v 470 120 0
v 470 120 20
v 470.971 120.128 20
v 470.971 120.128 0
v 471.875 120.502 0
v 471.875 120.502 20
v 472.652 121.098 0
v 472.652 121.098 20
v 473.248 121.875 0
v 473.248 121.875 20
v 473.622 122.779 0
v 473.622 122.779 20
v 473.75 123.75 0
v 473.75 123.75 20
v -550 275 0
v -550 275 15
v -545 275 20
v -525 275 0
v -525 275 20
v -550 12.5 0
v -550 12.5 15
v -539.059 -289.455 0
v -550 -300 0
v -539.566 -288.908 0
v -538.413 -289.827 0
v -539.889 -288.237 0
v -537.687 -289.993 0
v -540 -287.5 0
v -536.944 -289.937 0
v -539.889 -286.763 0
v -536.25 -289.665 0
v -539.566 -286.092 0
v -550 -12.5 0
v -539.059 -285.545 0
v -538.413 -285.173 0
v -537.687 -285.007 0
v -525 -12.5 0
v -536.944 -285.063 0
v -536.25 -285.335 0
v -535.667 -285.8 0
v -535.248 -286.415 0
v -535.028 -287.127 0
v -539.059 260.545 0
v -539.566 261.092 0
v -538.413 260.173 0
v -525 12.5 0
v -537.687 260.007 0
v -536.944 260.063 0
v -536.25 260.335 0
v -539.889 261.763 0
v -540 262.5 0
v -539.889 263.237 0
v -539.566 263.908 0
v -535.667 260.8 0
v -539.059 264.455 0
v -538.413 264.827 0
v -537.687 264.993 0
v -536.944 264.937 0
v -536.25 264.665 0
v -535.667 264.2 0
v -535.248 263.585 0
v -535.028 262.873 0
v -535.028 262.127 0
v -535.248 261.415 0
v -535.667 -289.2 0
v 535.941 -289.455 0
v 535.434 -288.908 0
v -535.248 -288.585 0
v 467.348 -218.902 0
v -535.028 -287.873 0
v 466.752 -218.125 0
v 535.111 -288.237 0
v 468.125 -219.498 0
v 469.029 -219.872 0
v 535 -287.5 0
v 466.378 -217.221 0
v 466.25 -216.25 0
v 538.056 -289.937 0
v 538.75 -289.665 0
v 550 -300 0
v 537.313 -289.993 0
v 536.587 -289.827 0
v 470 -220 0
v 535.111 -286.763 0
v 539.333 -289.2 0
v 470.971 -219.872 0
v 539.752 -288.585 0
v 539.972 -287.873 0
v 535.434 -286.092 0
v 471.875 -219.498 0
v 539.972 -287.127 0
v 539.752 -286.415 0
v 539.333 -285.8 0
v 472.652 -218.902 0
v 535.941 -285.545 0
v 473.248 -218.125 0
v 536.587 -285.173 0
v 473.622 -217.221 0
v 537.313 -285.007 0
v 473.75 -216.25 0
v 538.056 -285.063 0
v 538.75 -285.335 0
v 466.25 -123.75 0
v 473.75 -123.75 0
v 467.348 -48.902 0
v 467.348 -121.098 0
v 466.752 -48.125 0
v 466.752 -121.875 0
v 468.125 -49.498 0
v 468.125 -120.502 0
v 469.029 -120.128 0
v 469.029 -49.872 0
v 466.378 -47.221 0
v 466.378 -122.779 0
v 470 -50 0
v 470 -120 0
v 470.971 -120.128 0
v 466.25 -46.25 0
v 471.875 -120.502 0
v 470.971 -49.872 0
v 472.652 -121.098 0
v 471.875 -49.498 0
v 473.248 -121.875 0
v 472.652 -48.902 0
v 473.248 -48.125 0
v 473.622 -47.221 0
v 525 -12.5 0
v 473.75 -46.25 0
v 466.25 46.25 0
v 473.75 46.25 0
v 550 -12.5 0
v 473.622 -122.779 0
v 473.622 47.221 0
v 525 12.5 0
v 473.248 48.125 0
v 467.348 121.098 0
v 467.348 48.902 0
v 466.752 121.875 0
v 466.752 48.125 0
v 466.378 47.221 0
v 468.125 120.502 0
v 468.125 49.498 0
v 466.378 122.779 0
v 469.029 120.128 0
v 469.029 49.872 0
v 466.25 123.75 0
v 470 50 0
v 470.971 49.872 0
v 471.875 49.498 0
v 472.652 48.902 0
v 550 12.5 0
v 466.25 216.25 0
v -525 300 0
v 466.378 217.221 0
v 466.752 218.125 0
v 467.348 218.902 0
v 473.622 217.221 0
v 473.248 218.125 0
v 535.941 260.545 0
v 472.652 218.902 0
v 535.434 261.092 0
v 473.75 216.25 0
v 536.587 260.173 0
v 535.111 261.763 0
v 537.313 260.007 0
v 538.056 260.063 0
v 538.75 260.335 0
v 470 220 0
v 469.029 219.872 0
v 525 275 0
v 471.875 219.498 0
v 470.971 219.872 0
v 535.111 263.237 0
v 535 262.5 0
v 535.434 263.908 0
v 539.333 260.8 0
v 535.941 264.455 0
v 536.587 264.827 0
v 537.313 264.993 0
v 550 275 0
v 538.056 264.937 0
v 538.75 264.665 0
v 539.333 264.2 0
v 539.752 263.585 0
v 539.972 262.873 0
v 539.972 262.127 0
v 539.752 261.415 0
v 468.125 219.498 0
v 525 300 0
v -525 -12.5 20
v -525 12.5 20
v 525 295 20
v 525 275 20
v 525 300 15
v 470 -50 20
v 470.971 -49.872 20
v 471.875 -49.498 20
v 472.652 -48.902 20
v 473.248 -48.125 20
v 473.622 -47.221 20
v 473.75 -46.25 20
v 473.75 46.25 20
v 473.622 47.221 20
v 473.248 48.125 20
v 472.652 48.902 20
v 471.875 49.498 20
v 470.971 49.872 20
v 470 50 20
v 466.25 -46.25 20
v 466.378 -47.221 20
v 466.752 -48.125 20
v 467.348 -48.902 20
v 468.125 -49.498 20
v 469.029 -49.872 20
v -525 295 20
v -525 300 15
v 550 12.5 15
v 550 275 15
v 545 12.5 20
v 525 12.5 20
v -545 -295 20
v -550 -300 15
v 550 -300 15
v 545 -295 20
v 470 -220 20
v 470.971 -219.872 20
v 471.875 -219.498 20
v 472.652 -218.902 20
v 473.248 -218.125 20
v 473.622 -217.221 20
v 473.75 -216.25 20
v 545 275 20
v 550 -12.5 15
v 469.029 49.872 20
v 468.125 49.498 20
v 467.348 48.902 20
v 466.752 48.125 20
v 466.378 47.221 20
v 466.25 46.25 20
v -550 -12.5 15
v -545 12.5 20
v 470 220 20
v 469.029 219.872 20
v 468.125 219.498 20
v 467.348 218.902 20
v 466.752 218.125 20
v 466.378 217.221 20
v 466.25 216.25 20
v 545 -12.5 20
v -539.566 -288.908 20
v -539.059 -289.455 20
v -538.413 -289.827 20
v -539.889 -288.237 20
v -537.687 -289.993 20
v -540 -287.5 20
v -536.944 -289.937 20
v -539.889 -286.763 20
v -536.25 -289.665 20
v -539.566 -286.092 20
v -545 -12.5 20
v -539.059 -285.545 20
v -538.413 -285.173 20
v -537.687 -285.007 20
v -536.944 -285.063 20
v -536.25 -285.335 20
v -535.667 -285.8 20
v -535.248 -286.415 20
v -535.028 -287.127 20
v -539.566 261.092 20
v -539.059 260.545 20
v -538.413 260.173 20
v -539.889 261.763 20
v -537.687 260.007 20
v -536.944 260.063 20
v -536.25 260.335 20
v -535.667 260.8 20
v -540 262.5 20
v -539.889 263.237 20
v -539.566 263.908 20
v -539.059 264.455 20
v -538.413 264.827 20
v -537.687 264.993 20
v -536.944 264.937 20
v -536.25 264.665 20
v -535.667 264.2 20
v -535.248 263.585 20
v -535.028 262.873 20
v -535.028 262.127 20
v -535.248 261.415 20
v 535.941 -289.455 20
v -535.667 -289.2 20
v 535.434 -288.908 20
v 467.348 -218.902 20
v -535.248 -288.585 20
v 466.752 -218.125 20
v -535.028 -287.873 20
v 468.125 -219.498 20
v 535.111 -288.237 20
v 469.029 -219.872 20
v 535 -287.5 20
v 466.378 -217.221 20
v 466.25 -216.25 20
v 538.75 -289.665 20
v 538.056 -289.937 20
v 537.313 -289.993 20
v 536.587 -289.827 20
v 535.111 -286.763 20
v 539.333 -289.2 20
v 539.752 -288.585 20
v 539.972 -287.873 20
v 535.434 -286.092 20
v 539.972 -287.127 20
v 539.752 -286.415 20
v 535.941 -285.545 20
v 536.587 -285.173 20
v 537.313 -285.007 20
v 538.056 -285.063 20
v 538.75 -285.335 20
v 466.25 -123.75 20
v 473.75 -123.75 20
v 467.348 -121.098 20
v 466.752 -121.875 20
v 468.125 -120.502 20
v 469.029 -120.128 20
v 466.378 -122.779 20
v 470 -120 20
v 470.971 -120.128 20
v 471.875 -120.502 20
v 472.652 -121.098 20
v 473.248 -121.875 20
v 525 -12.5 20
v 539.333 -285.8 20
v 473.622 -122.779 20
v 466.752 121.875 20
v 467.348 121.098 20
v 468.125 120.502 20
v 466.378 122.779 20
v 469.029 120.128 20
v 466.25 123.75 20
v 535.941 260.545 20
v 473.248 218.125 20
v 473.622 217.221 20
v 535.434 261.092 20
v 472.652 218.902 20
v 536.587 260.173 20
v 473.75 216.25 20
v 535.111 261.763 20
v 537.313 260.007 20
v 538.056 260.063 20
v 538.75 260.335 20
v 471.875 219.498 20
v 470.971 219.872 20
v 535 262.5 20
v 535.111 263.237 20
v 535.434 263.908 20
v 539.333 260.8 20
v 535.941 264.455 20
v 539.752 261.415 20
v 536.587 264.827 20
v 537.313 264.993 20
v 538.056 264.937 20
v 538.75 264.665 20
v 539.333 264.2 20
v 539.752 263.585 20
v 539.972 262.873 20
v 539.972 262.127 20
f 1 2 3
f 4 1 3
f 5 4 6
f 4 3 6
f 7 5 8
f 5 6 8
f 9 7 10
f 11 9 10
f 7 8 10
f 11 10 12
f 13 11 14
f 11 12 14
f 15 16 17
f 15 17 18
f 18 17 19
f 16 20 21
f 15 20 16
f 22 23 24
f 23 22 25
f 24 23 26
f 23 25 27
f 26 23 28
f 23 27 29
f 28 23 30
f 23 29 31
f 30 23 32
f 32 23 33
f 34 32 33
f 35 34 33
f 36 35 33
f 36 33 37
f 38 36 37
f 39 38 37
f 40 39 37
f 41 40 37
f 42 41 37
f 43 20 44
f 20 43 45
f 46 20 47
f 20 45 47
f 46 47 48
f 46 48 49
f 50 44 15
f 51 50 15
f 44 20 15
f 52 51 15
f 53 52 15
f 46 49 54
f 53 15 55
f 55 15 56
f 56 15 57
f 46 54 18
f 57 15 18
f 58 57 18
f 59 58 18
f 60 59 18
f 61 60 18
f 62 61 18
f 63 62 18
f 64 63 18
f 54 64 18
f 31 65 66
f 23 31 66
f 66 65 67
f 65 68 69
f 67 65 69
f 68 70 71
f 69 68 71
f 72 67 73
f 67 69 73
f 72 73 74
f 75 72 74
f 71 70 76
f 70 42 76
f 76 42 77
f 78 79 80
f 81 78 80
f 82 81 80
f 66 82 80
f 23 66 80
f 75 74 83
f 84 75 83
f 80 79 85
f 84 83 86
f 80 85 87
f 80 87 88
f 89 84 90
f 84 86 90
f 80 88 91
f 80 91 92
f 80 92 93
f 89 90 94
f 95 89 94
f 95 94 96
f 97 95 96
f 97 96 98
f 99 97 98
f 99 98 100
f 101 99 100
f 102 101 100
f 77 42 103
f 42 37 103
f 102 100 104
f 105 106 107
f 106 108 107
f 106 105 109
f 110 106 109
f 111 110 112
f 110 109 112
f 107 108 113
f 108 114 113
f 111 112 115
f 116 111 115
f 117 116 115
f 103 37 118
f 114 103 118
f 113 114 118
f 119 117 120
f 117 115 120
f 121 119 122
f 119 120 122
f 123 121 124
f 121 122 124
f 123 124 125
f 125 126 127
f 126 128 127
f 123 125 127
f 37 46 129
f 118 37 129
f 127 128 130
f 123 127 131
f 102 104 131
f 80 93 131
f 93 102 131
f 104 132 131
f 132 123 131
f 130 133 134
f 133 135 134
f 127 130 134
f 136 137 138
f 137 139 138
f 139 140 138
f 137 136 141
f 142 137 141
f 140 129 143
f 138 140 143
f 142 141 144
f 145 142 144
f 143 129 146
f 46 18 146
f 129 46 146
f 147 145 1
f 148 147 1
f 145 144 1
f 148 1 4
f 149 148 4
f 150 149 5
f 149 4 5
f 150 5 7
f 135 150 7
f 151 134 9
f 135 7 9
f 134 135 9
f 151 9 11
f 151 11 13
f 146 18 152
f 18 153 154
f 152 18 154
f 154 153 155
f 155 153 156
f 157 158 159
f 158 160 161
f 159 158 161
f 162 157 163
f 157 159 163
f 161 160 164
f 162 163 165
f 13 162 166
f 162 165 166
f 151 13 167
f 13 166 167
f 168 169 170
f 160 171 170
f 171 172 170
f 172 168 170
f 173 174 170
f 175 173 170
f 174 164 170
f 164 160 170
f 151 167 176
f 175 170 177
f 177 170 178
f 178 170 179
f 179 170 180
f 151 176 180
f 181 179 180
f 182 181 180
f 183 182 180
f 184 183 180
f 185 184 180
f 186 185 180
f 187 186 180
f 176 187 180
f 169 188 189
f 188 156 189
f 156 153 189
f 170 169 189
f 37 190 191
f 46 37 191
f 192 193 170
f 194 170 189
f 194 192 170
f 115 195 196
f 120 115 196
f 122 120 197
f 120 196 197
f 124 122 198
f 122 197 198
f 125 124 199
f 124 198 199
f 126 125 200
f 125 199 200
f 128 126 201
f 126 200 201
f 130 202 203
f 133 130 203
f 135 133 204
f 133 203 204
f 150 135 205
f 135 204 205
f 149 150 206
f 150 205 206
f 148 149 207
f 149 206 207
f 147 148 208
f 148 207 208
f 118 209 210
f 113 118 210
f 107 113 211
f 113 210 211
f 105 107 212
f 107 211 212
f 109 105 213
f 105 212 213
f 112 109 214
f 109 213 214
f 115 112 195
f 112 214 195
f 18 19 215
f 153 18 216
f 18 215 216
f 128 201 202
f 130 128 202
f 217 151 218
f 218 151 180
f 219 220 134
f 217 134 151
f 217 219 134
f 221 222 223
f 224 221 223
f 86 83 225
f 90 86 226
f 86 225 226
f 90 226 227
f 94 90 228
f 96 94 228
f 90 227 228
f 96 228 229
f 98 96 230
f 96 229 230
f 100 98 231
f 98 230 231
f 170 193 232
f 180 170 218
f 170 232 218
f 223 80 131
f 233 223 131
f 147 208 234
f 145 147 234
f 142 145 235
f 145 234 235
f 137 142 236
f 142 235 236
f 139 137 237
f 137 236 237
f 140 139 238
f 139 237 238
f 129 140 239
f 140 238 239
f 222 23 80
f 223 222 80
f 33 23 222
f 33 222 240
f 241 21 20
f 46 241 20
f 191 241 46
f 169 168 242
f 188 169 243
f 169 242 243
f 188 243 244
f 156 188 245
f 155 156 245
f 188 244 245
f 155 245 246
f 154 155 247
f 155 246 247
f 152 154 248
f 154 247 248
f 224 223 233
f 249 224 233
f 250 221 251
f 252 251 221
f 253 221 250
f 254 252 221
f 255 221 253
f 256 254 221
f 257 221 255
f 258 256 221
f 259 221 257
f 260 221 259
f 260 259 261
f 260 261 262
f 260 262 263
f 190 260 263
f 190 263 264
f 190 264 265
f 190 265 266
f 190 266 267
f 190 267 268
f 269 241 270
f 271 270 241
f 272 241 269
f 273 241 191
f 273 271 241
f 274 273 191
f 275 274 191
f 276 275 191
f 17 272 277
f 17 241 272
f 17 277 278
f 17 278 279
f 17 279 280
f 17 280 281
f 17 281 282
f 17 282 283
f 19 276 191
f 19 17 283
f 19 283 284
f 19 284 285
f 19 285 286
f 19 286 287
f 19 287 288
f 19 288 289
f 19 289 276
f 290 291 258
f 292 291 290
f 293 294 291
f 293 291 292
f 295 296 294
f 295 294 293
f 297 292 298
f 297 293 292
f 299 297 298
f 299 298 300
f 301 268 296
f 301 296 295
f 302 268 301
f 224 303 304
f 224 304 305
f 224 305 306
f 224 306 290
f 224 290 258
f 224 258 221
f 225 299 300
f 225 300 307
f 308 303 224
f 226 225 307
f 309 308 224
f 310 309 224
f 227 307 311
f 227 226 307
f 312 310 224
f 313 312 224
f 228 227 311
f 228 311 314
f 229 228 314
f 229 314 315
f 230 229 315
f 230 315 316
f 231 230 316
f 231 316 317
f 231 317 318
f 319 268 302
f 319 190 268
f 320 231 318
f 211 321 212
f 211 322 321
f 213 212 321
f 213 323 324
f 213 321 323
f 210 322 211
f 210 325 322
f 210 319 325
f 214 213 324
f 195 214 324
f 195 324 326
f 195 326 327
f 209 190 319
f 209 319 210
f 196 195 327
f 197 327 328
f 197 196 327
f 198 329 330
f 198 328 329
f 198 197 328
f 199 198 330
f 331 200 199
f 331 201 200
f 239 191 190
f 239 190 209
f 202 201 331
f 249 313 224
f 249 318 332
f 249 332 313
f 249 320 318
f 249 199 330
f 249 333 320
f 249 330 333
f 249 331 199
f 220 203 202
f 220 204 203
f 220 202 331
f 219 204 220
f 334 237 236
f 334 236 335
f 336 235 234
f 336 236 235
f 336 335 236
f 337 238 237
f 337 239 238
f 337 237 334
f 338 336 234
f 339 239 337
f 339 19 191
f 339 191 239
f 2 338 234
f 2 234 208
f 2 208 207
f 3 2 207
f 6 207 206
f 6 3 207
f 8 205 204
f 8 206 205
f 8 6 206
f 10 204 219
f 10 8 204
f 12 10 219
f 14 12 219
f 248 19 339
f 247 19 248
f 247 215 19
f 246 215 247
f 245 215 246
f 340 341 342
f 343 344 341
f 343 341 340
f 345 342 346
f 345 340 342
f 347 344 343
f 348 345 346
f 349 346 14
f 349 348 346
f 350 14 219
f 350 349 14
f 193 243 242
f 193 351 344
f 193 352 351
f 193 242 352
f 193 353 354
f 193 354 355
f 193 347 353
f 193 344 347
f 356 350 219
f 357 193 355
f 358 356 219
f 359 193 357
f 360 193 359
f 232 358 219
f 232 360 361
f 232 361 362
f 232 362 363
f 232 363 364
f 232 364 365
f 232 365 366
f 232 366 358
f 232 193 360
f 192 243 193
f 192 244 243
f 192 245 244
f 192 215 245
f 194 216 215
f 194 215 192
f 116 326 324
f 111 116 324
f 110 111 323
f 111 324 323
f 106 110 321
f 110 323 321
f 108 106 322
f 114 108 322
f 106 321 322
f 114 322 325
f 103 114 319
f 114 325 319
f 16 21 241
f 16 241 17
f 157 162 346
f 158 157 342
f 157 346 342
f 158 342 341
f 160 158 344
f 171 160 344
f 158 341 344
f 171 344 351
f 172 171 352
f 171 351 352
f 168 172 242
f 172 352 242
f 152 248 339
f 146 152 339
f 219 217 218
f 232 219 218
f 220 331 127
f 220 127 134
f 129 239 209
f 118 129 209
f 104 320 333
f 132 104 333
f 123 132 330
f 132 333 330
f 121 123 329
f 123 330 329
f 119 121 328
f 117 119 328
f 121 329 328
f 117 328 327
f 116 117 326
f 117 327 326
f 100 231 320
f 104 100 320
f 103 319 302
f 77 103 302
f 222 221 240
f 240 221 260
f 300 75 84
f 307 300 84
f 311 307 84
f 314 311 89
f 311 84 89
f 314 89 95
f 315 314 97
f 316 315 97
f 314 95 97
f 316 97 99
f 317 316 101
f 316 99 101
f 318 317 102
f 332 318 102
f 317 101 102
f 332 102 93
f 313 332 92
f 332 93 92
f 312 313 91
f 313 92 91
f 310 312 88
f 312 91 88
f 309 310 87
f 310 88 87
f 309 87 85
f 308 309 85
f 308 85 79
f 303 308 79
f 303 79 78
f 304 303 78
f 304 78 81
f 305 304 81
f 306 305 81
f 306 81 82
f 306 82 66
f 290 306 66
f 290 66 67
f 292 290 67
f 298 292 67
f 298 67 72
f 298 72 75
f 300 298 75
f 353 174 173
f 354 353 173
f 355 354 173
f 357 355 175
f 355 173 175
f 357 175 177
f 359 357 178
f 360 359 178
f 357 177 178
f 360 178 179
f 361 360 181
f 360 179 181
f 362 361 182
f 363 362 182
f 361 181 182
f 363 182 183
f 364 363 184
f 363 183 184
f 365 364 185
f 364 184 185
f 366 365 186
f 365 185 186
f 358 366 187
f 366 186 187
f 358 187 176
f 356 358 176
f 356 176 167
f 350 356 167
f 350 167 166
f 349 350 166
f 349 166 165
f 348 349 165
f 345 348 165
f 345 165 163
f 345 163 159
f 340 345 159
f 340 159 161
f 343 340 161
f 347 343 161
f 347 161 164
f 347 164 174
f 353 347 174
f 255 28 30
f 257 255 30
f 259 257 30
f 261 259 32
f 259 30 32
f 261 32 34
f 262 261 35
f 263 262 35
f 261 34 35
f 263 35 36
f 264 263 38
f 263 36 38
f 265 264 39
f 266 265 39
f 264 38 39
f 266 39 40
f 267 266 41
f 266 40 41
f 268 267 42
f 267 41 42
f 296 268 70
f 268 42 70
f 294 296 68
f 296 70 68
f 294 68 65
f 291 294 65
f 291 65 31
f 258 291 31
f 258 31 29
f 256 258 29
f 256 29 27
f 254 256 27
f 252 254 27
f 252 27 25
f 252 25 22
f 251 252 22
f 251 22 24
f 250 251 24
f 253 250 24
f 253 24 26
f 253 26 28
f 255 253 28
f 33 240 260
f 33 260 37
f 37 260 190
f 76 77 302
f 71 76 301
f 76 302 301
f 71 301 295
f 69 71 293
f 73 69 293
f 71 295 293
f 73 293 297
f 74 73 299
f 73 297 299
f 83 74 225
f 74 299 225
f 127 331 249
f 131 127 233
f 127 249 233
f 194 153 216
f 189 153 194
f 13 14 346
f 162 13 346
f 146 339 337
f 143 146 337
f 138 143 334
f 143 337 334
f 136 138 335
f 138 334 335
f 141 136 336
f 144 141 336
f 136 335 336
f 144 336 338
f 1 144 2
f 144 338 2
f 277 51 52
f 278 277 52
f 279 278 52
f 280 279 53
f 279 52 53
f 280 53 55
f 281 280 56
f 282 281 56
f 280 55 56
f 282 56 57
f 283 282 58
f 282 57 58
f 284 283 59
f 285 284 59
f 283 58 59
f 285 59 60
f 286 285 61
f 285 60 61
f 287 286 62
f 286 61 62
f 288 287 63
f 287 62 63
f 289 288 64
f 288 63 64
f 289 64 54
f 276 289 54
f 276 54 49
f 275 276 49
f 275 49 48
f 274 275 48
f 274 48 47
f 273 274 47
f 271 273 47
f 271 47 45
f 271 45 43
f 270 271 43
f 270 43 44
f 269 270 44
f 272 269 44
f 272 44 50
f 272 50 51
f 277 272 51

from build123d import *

# Parameters (mm, degrees)
F0_W     = 1100
F0_H     = 600
F1_DEPTH = 20
F2_W     = 50
F2_H     = 25
F2_W_2   = 25
F3_DEPTH = 20.001
F5_D     = 5
F6_SIZE  = 5


with BuildPart() as f1:
    # F0 (on Top) → F1 (new body)
    with BuildSketch(Plane.XY):
        Rectangle(F0_W, F0_H)
    extrude(amount=F1_DEPTH)

    # F2 (on face) → F3 (cut, through all)
    with BuildSketch(Plane.XY.offset(20)):
        with BuildLine():
            Line((473.75, -216.25), (473.75, -123.75))
            ThreePointArc((473.75, -123.75), (472.65165, -121.09835), (470, -120))
            ThreePointArc((470, -120), (467.34835, -121.09835), (466.25, -123.75))
            Line((466.25, -123.75), (466.25, -216.25))
            ThreePointArc((466.25, -216.25), (467.34835, -218.90165), (470, -220))
            ThreePointArc((470, -220), (472.65165, -218.90165), (473.75, -216.25))
        make_face()
        with BuildLine():
            Line((473.75, -46.25), (473.75, 46.25))
            ThreePointArc((473.75, 46.25), (472.65165, 48.90165), (470, 50))
            ThreePointArc((470, 50), (467.34835, 48.90165), (466.25, 46.25))
            Line((466.25, 46.25), (466.25, -46.25))
            ThreePointArc((466.25, -46.25), (467.34835, -48.90165), (470, -50))
            ThreePointArc((470, -50), (472.65165, -48.90165), (473.75, -46.25))
        make_face()
        with BuildLine():
            Line((466.25, 216.25), (466.25, 123.75))
            ThreePointArc((466.25, 123.75), (467.34835, 121.09835), (470, 120))
            ThreePointArc((470, 120), (472.65165, 121.09835), (473.75, 123.75))
            Line((473.75, 123.75), (473.75, 216.25))
            ThreePointArc((473.75, 216.25), (472.65165, 218.90165), (470, 220))
            ThreePointArc((470, 220), (467.34835, 218.90165), (466.25, 216.25))
        make_face()
        with Locations((-550, 0)):
            Rectangle(F2_W, F2_H)
        with Locations((550, 0)):
            Rectangle(F2_W, F2_H)
        with Locations((-537.5, 287.5)):
            Rectangle(F2_W_2, F2_H)
        with Locations((537.5, 287.5)):
            Rectangle(F2_W_2, F2_H)
    extrude(amount=-F3_DEPTH, mode=Mode.SUBTRACT)

    # F5 (through all)
    with Locations(Plane.XY.offset(20)):
        with Locations((537.5, -287.5), (-537.5, -287.5), (537.5, 262.5), (-537.5, 262.5)):
            Hole(F5_D / 2)

    # F6
    f6_edges = [f1.edges().sort_by_distance(p)[0] for p in [
        (0, -300, 20),
        (-550, -156.25, 20),
        (-550, 143.75, 20),
        (0, 300, 20),
        (550, -156.25, 20),
        (550, 143.75, 20),
    ]]
    chamfer(f6_edges, length=F6_SIZE)


solid = f1.part
